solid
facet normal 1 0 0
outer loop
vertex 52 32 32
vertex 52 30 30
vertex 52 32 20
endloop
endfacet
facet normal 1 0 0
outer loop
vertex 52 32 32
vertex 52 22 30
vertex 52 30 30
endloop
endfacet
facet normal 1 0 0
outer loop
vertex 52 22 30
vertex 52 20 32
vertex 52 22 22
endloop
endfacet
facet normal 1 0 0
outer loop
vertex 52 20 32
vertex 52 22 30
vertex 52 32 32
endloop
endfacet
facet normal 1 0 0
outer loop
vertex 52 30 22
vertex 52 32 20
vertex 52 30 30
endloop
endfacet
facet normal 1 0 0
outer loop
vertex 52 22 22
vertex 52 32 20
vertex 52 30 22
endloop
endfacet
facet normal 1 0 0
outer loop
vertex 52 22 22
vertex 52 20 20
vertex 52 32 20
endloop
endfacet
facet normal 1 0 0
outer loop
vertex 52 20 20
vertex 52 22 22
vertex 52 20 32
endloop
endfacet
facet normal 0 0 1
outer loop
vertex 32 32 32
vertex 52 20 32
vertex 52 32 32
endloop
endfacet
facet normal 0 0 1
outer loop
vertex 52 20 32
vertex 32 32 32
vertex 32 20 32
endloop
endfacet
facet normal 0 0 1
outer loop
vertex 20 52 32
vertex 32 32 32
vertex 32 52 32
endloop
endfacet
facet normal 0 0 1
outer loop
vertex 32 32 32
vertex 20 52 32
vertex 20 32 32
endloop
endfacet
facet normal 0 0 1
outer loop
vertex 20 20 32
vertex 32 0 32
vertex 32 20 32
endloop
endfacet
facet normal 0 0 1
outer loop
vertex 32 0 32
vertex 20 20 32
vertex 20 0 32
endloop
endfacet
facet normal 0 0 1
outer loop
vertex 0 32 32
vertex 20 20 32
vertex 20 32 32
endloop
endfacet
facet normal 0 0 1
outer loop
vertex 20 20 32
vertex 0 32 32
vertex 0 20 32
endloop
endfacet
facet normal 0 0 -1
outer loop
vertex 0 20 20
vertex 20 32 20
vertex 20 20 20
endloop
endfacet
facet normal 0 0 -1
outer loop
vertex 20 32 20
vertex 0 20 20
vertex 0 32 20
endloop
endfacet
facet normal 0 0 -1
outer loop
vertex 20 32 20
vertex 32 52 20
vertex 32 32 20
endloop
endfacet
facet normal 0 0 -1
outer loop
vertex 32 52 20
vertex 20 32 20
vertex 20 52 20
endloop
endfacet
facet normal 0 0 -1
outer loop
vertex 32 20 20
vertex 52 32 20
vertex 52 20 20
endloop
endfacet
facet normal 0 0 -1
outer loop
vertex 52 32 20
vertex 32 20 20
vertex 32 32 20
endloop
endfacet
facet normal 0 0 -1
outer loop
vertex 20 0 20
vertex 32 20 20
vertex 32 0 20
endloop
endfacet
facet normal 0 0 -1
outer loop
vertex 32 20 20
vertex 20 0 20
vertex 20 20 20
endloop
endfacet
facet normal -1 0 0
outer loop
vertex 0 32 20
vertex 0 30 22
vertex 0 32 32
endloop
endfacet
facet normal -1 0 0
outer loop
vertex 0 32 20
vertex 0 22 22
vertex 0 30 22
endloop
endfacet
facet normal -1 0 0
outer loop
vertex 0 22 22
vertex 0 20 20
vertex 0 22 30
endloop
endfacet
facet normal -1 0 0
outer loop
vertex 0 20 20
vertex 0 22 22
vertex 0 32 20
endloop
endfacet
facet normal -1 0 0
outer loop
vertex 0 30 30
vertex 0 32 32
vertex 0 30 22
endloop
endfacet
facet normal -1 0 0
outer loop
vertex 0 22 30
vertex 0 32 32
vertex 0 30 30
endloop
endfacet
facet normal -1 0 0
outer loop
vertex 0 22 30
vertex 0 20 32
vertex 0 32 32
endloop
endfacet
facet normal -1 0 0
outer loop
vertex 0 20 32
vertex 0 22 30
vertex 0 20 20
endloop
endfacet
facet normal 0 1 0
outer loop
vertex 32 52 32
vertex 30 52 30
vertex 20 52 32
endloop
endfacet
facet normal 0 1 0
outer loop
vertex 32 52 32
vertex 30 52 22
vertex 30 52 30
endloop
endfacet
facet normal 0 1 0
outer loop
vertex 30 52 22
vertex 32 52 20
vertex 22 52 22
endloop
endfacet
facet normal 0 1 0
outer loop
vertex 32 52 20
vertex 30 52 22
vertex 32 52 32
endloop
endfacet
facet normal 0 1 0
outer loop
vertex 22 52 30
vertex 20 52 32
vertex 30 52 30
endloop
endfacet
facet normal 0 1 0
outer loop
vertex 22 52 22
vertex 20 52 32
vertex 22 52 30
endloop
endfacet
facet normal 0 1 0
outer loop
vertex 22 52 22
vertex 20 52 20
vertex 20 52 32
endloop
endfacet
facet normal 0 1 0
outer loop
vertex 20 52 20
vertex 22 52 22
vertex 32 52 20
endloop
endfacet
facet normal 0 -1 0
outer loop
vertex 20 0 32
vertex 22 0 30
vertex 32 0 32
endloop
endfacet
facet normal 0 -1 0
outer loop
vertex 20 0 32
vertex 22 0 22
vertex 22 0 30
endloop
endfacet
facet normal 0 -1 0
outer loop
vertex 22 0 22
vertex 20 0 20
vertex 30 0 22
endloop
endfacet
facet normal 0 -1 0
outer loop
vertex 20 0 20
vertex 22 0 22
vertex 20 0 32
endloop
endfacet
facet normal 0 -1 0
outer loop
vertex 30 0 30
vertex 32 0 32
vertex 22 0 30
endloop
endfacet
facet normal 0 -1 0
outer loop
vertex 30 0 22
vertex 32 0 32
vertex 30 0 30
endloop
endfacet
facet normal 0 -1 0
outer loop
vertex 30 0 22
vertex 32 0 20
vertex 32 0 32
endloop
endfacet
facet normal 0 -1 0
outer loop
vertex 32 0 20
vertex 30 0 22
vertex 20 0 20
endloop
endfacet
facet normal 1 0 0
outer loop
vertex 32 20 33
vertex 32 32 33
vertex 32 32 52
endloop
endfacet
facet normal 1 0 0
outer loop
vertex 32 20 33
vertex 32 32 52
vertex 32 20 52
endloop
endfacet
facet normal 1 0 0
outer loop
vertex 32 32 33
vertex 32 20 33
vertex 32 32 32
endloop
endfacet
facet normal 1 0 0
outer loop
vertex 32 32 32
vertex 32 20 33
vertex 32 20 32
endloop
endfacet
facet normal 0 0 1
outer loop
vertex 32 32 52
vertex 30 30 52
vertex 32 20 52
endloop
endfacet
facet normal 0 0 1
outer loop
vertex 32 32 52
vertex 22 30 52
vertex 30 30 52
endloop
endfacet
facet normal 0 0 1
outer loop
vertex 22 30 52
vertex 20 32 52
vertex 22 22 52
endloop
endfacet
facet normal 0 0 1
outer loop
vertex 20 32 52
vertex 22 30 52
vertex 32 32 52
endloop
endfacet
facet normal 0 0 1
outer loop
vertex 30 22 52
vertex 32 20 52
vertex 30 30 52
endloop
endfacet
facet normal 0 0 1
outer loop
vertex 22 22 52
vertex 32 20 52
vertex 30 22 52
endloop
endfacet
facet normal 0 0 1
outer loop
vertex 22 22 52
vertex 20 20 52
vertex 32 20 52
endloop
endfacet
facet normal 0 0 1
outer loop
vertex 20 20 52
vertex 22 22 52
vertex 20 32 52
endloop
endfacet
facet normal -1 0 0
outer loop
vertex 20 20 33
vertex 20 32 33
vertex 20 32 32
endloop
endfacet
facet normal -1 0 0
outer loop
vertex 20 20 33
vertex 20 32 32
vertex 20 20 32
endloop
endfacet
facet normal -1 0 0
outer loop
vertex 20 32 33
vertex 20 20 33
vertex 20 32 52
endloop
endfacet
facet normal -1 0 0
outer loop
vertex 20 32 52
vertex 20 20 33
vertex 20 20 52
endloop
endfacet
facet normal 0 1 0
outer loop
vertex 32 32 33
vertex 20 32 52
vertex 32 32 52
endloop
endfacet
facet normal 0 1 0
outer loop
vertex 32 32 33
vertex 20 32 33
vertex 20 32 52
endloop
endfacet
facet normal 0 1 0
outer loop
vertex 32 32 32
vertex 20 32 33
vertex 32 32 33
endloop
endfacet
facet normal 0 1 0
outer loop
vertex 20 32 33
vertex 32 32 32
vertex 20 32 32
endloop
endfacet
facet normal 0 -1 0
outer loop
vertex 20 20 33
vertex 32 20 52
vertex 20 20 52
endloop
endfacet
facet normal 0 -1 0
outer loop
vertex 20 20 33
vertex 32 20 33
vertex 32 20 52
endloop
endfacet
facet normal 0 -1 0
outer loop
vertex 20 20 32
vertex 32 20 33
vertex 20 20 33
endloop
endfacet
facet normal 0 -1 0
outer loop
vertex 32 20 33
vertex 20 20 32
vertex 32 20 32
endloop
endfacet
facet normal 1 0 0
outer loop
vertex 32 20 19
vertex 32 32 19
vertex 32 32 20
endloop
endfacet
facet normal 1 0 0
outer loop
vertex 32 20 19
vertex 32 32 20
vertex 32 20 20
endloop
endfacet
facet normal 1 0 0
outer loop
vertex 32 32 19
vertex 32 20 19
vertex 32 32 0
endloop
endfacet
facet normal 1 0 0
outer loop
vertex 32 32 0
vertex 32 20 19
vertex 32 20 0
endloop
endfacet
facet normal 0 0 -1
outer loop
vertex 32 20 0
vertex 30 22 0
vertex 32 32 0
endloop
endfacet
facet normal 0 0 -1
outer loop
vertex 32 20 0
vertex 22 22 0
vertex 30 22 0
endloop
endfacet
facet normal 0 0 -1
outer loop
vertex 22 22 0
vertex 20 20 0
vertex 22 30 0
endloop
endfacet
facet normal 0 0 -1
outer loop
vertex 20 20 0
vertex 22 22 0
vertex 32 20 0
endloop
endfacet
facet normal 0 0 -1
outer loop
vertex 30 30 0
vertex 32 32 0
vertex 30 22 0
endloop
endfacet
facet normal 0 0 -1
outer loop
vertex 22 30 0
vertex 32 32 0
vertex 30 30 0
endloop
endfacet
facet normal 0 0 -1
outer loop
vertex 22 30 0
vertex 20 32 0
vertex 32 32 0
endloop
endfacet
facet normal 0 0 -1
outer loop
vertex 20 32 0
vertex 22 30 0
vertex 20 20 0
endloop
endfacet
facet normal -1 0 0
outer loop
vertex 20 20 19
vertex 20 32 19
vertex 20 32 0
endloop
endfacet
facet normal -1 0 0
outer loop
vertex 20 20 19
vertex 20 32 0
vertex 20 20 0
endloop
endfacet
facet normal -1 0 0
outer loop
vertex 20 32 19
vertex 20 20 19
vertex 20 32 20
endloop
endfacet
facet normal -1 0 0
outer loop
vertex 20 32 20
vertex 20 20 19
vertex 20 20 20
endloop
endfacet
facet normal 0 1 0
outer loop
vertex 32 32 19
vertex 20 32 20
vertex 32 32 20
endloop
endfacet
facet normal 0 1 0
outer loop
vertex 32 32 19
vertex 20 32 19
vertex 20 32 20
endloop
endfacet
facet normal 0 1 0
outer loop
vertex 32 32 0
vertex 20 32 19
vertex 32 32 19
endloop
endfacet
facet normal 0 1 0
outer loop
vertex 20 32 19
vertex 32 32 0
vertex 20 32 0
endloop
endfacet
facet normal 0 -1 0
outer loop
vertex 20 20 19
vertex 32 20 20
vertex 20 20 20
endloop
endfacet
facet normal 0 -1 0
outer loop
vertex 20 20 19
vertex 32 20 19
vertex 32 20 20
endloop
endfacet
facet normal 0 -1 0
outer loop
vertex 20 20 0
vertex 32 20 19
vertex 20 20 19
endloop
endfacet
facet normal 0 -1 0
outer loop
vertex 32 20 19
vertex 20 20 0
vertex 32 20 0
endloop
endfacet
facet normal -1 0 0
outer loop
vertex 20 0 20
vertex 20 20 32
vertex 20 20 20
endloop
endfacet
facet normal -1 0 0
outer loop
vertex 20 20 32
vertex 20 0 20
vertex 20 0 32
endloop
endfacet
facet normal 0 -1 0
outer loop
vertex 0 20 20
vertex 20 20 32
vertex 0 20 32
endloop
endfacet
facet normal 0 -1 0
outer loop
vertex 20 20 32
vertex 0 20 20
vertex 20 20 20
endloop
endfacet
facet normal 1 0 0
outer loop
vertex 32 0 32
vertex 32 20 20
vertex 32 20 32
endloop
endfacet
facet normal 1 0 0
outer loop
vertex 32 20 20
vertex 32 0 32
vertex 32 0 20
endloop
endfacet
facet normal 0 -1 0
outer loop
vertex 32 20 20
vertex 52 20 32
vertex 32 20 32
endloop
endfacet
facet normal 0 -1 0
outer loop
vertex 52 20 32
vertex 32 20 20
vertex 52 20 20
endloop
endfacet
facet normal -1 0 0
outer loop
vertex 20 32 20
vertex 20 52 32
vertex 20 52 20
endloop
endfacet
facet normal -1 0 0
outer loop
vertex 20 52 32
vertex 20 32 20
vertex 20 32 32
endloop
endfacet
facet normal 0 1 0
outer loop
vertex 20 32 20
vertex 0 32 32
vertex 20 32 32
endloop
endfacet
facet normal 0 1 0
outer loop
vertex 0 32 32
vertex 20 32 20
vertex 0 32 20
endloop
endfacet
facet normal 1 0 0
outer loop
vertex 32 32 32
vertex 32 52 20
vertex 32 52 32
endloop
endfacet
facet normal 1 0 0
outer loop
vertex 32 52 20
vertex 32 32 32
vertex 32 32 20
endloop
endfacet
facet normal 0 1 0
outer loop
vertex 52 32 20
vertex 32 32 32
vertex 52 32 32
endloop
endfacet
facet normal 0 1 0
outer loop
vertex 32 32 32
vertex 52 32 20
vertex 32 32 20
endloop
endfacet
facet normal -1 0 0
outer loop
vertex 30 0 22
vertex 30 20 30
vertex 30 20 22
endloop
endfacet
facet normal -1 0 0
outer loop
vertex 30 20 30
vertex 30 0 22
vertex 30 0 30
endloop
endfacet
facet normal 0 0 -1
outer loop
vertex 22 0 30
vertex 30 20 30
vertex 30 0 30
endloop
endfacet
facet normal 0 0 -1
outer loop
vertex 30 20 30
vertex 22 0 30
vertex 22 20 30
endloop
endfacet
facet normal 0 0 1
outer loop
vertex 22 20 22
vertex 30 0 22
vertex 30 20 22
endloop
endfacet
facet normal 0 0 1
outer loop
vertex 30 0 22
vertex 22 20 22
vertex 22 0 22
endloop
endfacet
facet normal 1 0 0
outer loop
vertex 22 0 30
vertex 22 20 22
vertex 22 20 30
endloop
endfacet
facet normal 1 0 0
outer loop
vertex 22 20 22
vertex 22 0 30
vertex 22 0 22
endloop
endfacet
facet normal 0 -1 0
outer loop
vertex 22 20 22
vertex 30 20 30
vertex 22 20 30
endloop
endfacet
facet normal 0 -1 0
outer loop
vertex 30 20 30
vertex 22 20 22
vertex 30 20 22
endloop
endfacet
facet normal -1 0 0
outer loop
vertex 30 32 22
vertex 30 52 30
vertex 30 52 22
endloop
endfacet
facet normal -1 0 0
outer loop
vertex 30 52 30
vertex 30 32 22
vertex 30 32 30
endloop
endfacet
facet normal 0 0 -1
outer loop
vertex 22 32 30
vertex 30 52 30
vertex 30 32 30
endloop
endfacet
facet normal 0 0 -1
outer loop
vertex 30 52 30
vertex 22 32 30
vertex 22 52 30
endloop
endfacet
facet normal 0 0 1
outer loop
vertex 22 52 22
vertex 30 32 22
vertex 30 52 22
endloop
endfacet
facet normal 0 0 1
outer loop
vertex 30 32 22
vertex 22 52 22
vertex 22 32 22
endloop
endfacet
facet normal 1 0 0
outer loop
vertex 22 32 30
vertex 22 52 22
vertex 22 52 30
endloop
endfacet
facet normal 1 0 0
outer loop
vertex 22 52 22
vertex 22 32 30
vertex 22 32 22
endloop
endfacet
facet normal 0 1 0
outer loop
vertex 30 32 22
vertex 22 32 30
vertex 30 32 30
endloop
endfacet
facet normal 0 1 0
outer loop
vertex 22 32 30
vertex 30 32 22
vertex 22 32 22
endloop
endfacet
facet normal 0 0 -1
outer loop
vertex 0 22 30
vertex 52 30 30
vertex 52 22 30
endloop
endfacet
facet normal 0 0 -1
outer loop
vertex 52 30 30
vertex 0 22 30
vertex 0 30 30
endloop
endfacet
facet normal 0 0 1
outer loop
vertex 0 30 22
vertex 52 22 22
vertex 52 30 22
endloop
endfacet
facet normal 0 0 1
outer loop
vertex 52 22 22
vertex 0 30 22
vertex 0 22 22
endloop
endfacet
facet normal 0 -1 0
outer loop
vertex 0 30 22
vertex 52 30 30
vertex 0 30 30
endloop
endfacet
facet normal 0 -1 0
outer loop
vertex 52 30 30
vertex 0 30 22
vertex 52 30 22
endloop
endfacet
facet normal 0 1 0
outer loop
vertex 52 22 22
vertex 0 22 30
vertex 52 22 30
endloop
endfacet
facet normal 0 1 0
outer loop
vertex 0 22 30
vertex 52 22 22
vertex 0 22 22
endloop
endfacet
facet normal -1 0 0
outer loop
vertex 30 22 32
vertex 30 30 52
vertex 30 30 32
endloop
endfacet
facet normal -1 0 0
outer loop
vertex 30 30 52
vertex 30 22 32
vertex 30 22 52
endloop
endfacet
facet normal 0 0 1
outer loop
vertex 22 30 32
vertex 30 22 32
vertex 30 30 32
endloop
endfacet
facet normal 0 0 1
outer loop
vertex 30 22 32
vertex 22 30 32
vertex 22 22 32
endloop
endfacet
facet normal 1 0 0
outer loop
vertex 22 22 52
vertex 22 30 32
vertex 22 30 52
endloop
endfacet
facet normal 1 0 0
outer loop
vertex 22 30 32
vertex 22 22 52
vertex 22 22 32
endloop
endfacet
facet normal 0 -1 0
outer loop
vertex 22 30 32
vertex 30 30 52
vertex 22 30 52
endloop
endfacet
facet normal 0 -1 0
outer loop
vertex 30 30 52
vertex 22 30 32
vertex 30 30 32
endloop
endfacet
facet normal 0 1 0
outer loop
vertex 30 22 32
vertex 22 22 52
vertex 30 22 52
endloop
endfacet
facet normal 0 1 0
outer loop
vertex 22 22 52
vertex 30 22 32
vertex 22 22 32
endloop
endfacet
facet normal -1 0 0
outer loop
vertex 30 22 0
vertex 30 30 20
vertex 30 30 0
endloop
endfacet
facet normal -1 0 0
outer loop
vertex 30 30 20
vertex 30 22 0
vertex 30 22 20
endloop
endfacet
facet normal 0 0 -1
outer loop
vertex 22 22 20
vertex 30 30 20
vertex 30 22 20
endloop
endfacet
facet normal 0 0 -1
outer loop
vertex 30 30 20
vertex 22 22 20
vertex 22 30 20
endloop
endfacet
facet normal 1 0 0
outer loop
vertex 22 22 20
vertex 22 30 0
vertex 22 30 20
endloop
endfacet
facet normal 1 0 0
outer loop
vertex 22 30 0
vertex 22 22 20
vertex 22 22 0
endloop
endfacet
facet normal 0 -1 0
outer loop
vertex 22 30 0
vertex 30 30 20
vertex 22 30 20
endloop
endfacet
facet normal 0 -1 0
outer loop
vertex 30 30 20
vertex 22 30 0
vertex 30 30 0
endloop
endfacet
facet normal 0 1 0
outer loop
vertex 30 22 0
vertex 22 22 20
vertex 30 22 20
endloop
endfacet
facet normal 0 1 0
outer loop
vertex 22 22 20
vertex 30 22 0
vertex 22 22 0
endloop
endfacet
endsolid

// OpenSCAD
/* 
 * Universal connectors generator - rectangular version
 * See connectors type to choose from
 * all units are in milimeters
 *
 * author R. A. - 2015/12/01
 * e-mail: thingiverse@dexter.sk
 * Thingiverse username: dexterko
 *
 * Feel free to modify and distribute, but please keep the credits;-)
 */
    
    
outer_width = 12;
hole_width = 8;
connect_length = 20;
connector_type = "XX_conn"; // [I_conn:Bare I connector - 2 connects, L_conn:Flat L connector - 2 connects, T_conn:Flat T connector - 3 connects, X_conn:Flat X connector - 4 connects, LL_conn:Edge Connector - 3 connects, TT_conn:T Connector with side connect - 4 connects, XT_conn:X Connector with  side-connect - 5 connects, XX_conn:full 3D Cross Connector - 6 connects]

if (connector_type == "I_conn") {
    I_conn(outer_width, hole_width, connect_length);
} else if (connector_type == "L_conn") {
    L_conn(outer_width, hole_width, connect_length);
} else if (connector_type == "T_conn") {
    T_conn(outer_width, hole_width, connect_length);
} else if (connector_type == "X_conn") {
    X_conn(outer_width, hole_width, connect_length);
} else if (connector_type == "LL_conn") {
    LL_conn(outer_width, hole_width, connect_length);
} else if (connector_type == "TT_conn") {
    TT_conn(outer_width, hole_width, connect_length); 
} else if (connector_type == "XT_conn") {
    XT_conn(outer_width, hole_width, connect_length);
} else if (connector_type == "XX_conn") {
    XX_conn(outer_width, hole_width, connect_length);


}

module I_conn(outer_width, hole_width, connect_length) {
    difference() {
      cube([outer_width, outer_width, connect_length*2]);
      
      translate([(outer_width-hole_width)/2, (outer_width-hole_width)/2, 0])
      cube([hole_width, hole_width, connect_length*2]);
    }
}


module L_conn(outer_width, hole_width, connect_length) {
    difference() {
        union() {
            // Vertical connect
            translate([0, 0, outer_width])
            cube([outer_width, outer_width, connect_length]);
    
            // Edge connect - solid, no holes
            cube([outer_width, outer_width, outer_width]);
    
            // Horizontal connect
            rotate([90, 0, 0])
            translate([0, 0, 0])
            cube([outer_width, outer_width, connect_length]);
        }

        // Inner hole - vertical
        translate([(outer_width-hole_width)/2, (outer_width-hole_width)/2, outer_width])
        cube([hole_width, hole_width, connect_length]);
    
        // Inner hole - horizontal
        rotate([90, 0, 0])
        translate([(outer_width-hole_width)/2, (outer_width-hole_width)/2, 0])
        cube([hole_width, hole_width, connect_length]);
        }
    }

module T_conn(outer_width, hole_width, connect_length) {
    difference() {
        union() {
            // Vertical connect
            translate([0, 0, outer_width])
            cube([outer_width, outer_width, connect_length]);
    
            // Edge connect - solid, no holes
            // cube([outer_width, outer_width, outer_width]);
    
            // Horizontal connect
            rotate([90, 0, 0])
            translate([0, 0, 0-connect_length-outer_width])
            cube([outer_width, outer_width, connect_length*2+outer_width]);
        }

        // Inner hole - vertical
        translate([(outer_width-hole_width)/2, (outer_width-hole_width)/2, outer_width])
        cube([hole_width, hole_width, connect_length]);
    
        // Inner hole - horizontal
        rotate([90, 0, 0])
        translate([(outer_width-hole_width)/2, (outer_width-hole_width)/2, 0-connect_length-outer_width])
        cube([hole_width, hole_width, connect_length*2+outer_width]);
        }
    }    
    
    
module X_conn(outer_width, hole_width, connect_length) {
    difference() {
        cube([(connect_length*2)+outer_width, (connect_length*2)+outer_width, outer_width]);
        
        translate([-1,-1,-1])
        cube([connect_length+1,connect_length+1, outer_width+2]);
        
        translate([connect_length+outer_width, -1, -1])
        cube([connect_length+1, connect_length+1, outer_width+2]);
        
        translate([-1, connect_length+outer_width, -1])
        cube([connect_length+1, connect_length+1, outer_width+2]);
        
        translate([connect_length+outer_width, connect_length+outer_width, -1])
        cube([connect_length+1, connect_length+1, outer_width+2]);
        
        // Inner hole 1
        translate([connect_length+(outer_width-hole_width)/2, 0, (outer_width-hole_width)/2])
        cube([hole_width, connect_length, hole_width]);
    
        // Inner hole 2
        translate([connect_length+(outer_width-hole_width)/2, connect_length+outer_width, (outer_width-hole_width)/2])
        cube([hole_width, connect_length, hole_width]);
        
        // Inner hole 3(see through)
        translate([0, connect_length+((outer_width-hole_width)/2), (outer_width-hole_width)/2])
        cube([connect_length*2+outer_width, hole_width, hole_width]);
        }
    }    
    

module LL_conn(outer_width, hole_width, connect_length) {
    difference() {
        union() {
            cube([connect_length+outer_width, connect_length+outer_width, outer_width]);
            translate([connect_length, connect_length, outer_width])
            cube([outer_width, outer_width, connect_length]);
        }
        translate([-1,-1,-1])  
        cube([connect_length+1,connect_length+1, outer_width+2]);
        
        // Inner hole 1
        translate([connect_length+(outer_width-hole_width)/2, 0, (outer_width-hole_width)/2])
        cube([hole_width, connect_length, hole_width]);
        
        // Inner hole 2(see through)
        translate([0, connect_length+((outer_width-hole_width)/2), (outer_width-hole_width)/2])
        cube([connect_length, hole_width, hole_width]);
        
        translate([connect_length+(outer_width-hole_width)/2, connect_length+(outer_width-hole_width)/2, outer_width])
        cube([hole_width, hole_width, connect_length]);
        }
    }    
    
module TT_conn(outer_width, hole_width, connect_length) {
    difference() {
        union() {
            cube([(connect_length*2)+outer_width, connect_length+outer_width, outer_width]);
            translate([connect_length, connect_length, outer_width])
            cube([outer_width, outer_width, connect_length]);
        }
        translate([-1,-1,-1])    
        cube([connect_length+1,connect_length+1, outer_width+2]);
        
        translate([connect_length+outer_width, -1, -1])
        cube([connect_length+1, connect_length+1, outer_width+2]);
        
        // Inner hole 1
        translate([connect_length+(outer_width-hole_width)/2, 0, (outer_width-hole_width)/2])
        cube([hole_width, connect_length, hole_width]);
        
        // Inner hole 2(see through)
        translate([0, connect_length+((outer_width-hole_width)/2), (outer_width-hole_width)/2])
        cube([connect_length*2+outer_width, hole_width, hole_width]);
        
        translate([connect_length+(outer_width-hole_width)/2, connect_length+(outer_width-hole_width)/2, outer_width])
            cube([hole_width, hole_width, connect_length]);
        }
    }    
    
module XT_conn(outer_width, hole_width, connect_length) {
    difference() {
        union() {
            cube([(connect_length*2)+outer_width, (connect_length*2)+outer_width, outer_width]);
            translate([connect_length, connect_length, outer_width])
            cube([outer_width, outer_width, connect_length]);
        }
        translate([-1,-1,-1])
        cube([connect_length+1,connect_length+1, outer_width+2]);
        
        translate([connect_length+outer_width, -1, -1])
        cube([connect_length+1, connect_length+1, outer_width+2]);
        
        translate([-1, connect_length+outer_width, -1])
        cube([connect_length+1, connect_length+1, outer_width+2]);
        
        translate([connect_length+outer_width, connect_length+outer_width, -1])
        cube([connect_length+1, connect_length+1, outer_width+2]);
        
        // Inner hole 1
        translate([connect_length+(outer_width-hole_width)/2, 0, (outer_width-hole_width)/2])
        cube([hole_width, connect_length, hole_width]);
    
        // Inner hole 2
        translate([connect_length+(outer_width-hole_width)/2, connect_length+outer_width, (outer_width-hole_width)/2])
        cube([hole_width, connect_length, hole_width]);
        
        // Inner hole 3(see through)
        translate([0, connect_length+((outer_width-hole_width)/2), (outer_width-hole_width)/2])
        cube([connect_length*2+outer_width, hole_width, hole_width]);
        
        translate([connect_length+(outer_width-hole_width)/2, connect_length+(outer_width-hole_width)/2, outer_width])
            cube([hole_width, hole_width, connect_length]);
        }
    }    
    
module XX_conn(outer_width, hole_width, connect_length) {
    difference() {
        union() {
            translate([0, 0, connect_length])
            cube([(connect_length*2)+outer_width, (connect_length*2)+outer_width, outer_width]);
            
            translate([connect_length, connect_length, connect_length+outer_width])
            cube([outer_width, outer_width, connect_length]);
            
            translate([connect_length, connect_length, 0])
            cube([outer_width, outer_width, connect_length]);
        } 
        translate([-1, -1, connect_length-1])
        cube([connect_length+1,connect_length+1, outer_width+2]);
        
        translate([connect_length+outer_width, -1, connect_length-1])
        cube([connect_length+1, connect_length+1, outer_width+2]);
        
        translate([-1, connect_length+outer_width, connect_length-1])
        cube([connect_length+1, connect_length+1, outer_width+2]);
        
        translate([connect_length+outer_width, connect_length+outer_width, connect_length-1])
        cube([connect_length+1, connect_length+1, outer_width+2]);
        
        // Inner hole 1
        translate([connect_length+(outer_width-hole_width)/2, 0, (outer_width-hole_width)/2+connect_length])
        cube([hole_width, connect_length, hole_width]);
    
        // Inner hole 2
        translate([connect_length+(outer_width-hole_width)/2, connect_length+outer_width, (outer_width-hole_width)/2+connect_length])
        cube([hole_width, connect_length, hole_width]);
        
        // Inner hole 3(see through)
        translate([0, connect_length+((outer_width-hole_width)/2), (outer_width-hole_width)/2+connect_length])
        cube([connect_length*2+outer_width, hole_width, hole_width]);
        
        // Inner hole 4
        translate([connect_length+(outer_width-hole_width)/2, connect_length+(outer_width-hole_width)/2, connect_length+outer_width])
        cube([hole_width, hole_width, connect_length]);
            
        // Inner hole 5
        translate([connect_length+(outer_width-hole_width)/2, connect_length+(outer_width-hole_width)/2, 0])
        cube([hole_width, hole_width, connect_length]);
        }
    }    
    
